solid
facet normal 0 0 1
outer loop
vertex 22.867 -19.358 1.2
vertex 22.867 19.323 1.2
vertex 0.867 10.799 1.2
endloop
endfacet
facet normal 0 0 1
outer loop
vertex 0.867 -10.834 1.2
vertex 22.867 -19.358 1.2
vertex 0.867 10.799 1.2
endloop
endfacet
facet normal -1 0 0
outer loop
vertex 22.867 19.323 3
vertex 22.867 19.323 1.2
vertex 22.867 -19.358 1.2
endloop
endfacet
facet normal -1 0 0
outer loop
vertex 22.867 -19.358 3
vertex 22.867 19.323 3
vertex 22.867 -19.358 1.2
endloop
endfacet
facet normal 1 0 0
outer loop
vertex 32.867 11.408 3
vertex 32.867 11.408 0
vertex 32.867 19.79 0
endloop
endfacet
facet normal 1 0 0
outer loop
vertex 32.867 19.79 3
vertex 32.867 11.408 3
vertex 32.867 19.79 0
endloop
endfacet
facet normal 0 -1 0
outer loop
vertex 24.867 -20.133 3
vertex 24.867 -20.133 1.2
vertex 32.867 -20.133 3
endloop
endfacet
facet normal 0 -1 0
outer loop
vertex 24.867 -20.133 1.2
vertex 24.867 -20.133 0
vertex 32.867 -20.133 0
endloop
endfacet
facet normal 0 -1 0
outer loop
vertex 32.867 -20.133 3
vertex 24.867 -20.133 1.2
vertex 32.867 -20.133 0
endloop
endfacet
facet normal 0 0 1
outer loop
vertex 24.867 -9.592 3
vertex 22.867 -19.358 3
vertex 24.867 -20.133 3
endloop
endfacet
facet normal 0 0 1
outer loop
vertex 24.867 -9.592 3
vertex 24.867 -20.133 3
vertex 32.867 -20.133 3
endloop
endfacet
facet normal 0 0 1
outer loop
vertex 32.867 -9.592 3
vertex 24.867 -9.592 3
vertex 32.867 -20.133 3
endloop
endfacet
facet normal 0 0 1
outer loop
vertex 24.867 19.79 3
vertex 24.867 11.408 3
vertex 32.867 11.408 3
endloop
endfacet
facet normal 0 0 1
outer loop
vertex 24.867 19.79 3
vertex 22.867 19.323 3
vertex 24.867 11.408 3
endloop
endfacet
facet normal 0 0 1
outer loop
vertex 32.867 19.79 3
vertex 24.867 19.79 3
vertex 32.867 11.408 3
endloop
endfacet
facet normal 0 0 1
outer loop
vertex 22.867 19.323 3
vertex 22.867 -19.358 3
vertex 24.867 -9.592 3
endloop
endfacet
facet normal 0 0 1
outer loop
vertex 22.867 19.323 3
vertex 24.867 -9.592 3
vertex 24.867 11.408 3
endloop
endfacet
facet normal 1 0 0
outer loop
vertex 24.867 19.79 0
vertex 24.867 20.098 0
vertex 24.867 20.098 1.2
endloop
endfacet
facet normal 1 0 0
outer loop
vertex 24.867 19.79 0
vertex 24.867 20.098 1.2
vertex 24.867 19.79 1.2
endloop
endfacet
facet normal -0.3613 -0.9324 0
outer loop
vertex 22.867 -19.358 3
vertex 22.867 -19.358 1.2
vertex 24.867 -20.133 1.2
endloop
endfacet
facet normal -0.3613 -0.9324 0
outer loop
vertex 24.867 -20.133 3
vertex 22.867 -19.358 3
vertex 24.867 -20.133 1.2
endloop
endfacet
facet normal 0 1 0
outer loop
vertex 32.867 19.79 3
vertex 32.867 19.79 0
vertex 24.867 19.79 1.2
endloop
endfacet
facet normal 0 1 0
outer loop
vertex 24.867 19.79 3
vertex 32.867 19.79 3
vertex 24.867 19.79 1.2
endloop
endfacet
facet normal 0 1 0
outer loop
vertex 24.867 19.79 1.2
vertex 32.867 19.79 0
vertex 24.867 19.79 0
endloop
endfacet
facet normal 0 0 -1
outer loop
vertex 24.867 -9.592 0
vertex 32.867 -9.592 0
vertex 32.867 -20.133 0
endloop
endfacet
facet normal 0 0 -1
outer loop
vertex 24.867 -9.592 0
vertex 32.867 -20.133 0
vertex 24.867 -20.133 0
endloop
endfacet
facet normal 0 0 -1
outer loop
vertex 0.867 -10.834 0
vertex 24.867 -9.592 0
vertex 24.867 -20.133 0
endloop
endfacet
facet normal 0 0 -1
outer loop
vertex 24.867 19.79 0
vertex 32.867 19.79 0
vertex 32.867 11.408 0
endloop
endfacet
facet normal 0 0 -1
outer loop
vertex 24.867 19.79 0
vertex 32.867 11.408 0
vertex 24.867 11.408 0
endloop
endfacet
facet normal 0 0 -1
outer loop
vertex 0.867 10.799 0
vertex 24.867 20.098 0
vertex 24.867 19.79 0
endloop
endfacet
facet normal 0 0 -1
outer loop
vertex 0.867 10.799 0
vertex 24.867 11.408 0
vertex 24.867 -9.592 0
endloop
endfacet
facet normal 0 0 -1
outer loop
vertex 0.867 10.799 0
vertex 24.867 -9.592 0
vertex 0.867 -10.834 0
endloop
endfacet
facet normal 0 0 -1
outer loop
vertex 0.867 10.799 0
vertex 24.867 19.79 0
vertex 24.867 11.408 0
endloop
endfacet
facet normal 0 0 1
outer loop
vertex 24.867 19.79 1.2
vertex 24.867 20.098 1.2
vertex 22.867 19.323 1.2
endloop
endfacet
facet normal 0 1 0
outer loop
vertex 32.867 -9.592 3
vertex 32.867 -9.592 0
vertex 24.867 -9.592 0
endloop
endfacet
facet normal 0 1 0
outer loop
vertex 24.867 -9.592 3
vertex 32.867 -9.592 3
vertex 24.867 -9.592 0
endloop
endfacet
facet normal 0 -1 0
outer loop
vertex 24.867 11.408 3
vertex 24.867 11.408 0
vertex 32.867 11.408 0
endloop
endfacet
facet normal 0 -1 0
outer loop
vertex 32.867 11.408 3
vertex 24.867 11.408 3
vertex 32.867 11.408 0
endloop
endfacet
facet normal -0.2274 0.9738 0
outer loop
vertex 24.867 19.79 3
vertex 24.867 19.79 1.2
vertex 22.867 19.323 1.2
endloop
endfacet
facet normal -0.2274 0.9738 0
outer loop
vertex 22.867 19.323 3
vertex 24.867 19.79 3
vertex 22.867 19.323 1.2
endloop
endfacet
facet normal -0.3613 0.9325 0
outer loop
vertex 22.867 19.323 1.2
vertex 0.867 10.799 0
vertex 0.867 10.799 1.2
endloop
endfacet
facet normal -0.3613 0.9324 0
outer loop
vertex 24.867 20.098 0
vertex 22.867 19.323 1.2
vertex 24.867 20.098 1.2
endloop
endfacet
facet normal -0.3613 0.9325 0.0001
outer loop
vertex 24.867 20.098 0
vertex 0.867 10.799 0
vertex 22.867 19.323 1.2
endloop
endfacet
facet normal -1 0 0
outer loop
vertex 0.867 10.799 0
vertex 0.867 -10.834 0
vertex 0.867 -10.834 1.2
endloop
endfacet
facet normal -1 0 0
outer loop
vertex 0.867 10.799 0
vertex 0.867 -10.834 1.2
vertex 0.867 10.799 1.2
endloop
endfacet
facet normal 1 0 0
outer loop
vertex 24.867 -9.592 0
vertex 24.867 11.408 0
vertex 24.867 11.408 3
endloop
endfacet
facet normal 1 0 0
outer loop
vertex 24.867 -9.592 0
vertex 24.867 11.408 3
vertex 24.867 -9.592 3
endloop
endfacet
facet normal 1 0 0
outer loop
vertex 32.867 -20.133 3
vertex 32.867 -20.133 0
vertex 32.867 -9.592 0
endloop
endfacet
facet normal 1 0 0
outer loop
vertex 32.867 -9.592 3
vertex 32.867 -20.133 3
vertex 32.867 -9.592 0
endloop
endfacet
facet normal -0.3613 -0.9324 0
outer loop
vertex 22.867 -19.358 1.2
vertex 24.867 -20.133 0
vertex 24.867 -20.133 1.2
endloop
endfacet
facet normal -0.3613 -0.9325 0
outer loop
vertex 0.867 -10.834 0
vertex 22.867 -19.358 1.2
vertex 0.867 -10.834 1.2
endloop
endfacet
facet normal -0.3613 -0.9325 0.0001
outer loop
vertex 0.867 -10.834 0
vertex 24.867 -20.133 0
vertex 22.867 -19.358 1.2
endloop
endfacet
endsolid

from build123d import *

# Parameters (mm, degrees)
BOSS_EXTRUDE1_DEPTH = 1.2
BOSS_EXTRUDE2_DEPTH = 3


with BuildPart() as part:
    # Sketch1 → Boss-Extrude1 (new body)
    with BuildSketch(Plane.XY):
        Polygon((0.866929529, 10.79891165), (24.866929529, 20.098165538), (24.866929529, -20.133015932), (0.866929529, -10.833762045), align=None)
    extrude(amount=BOSS_EXTRUDE1_DEPTH)

    # Sketch2 → Boss-Extrude2 (add)
    with BuildSketch(Plane(origin=(0, 0, 0), x_dir=(-1, 0, 0), z_dir=(0, 0, -1))):
        Polygon((-24.866929529, 19.789566237), (-22.866929529, 19.323227714), (-22.866929529, -19.358078108), (-24.866929529, -20.133015932), (-32.866929529, -20.133015932), (-32.866929529, -9.592041142), (-24.866929529, -9.592041142), (-24.866929529, 11.407958858), (-32.866929529, 11.407958858), (-32.866929529, 19.789566237), align=None)
    extrude(amount=-BOSS_EXTRUDE2_DEPTH)


solid = part.part
